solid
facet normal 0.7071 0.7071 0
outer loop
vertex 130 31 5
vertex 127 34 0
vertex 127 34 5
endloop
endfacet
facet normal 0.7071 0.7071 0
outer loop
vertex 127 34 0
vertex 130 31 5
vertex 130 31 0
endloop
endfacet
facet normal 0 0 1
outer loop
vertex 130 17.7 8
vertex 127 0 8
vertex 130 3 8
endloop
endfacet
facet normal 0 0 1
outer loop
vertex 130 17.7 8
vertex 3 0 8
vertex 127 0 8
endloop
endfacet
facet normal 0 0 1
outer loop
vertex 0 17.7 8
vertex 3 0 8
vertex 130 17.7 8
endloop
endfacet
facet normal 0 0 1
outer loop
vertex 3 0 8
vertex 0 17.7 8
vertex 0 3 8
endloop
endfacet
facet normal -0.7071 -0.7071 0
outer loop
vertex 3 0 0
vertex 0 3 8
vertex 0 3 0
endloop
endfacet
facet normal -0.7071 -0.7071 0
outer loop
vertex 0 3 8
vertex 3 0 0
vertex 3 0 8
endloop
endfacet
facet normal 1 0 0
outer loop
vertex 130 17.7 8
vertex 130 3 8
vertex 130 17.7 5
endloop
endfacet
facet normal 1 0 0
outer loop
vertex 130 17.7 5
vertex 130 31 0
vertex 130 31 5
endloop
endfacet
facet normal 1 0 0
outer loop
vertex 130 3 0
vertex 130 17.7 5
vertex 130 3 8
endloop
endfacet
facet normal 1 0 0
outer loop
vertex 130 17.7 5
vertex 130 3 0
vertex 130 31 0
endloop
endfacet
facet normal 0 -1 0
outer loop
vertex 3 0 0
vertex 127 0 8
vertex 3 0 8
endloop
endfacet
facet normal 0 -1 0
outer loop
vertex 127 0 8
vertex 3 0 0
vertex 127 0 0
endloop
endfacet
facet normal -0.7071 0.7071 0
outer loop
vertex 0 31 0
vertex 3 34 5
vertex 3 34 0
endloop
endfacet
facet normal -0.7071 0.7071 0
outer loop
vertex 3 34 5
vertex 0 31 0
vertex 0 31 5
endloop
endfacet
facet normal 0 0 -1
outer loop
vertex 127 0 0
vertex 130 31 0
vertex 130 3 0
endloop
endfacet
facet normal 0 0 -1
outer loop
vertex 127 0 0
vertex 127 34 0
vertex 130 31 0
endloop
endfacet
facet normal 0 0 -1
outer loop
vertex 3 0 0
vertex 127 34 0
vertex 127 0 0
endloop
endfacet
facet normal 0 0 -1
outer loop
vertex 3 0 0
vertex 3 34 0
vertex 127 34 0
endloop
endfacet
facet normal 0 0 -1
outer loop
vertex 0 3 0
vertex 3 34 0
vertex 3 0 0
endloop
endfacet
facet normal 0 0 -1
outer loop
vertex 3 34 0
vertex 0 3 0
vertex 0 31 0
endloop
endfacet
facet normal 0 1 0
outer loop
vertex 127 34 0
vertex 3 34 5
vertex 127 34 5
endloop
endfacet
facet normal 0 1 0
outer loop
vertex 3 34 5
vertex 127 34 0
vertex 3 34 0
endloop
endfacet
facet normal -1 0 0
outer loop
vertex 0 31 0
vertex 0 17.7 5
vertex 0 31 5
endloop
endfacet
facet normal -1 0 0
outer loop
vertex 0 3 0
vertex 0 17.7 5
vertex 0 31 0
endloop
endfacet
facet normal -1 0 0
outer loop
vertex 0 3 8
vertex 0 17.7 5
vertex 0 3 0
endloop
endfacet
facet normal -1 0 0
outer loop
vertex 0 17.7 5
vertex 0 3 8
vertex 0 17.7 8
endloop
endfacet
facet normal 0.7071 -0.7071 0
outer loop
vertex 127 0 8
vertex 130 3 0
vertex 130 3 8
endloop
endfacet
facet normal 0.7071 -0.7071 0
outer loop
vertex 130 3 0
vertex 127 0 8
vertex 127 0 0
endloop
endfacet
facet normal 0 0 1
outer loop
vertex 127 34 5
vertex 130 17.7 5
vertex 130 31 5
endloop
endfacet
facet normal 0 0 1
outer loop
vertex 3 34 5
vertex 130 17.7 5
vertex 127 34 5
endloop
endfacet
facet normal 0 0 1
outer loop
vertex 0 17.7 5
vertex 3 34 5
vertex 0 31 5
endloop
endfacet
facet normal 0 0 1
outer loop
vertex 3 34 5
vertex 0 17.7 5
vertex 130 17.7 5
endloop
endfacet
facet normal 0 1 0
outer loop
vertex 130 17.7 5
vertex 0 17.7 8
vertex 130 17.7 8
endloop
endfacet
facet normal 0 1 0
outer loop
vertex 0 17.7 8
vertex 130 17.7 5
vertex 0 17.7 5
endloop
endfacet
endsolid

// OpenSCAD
$fn = 32;

// ----------------------------------------------------------------------
// Stepped bar: sidestep, 130 x 34 x 8/5 mm
// ----------------------------------------------------------------------

// --- parameters (mm) ---
bar_l = 130;              // bar length, X
bar_w = 34;               // bar width, Y
plate_t = 8;              // thickness of the thick zone, Z
thin_t = 5;               // thickness of the thin zone
corner_c = 3;             // corner chamfer of the bar
step_cut = 3;             // material removed from the thin zone
ledge_y = 17.7;           // start of the ledge from the front edge
depth_1 = 3;              // depth of cut 1 from the top face

profile = [[3, 0], [127, 0], [130, 3], [130, 31], [127, 34], [3, 34], [0, 31], [0, 3]];  // primary outline, 8 points, counter clockwise
void_1 = [[-1, 17.7], [131, 17.7], [131, 35], [-1, 35]];  // ledge cut along one edge, 4 points

// --- the one profile operation ---
difference() {
  linear_extrude(height = plate_t) polygon(points = profile);
  translate([0, 0, plate_t - depth_1])
    linear_extrude(height = depth_1 + 1) polygon(points = void_1);
}
